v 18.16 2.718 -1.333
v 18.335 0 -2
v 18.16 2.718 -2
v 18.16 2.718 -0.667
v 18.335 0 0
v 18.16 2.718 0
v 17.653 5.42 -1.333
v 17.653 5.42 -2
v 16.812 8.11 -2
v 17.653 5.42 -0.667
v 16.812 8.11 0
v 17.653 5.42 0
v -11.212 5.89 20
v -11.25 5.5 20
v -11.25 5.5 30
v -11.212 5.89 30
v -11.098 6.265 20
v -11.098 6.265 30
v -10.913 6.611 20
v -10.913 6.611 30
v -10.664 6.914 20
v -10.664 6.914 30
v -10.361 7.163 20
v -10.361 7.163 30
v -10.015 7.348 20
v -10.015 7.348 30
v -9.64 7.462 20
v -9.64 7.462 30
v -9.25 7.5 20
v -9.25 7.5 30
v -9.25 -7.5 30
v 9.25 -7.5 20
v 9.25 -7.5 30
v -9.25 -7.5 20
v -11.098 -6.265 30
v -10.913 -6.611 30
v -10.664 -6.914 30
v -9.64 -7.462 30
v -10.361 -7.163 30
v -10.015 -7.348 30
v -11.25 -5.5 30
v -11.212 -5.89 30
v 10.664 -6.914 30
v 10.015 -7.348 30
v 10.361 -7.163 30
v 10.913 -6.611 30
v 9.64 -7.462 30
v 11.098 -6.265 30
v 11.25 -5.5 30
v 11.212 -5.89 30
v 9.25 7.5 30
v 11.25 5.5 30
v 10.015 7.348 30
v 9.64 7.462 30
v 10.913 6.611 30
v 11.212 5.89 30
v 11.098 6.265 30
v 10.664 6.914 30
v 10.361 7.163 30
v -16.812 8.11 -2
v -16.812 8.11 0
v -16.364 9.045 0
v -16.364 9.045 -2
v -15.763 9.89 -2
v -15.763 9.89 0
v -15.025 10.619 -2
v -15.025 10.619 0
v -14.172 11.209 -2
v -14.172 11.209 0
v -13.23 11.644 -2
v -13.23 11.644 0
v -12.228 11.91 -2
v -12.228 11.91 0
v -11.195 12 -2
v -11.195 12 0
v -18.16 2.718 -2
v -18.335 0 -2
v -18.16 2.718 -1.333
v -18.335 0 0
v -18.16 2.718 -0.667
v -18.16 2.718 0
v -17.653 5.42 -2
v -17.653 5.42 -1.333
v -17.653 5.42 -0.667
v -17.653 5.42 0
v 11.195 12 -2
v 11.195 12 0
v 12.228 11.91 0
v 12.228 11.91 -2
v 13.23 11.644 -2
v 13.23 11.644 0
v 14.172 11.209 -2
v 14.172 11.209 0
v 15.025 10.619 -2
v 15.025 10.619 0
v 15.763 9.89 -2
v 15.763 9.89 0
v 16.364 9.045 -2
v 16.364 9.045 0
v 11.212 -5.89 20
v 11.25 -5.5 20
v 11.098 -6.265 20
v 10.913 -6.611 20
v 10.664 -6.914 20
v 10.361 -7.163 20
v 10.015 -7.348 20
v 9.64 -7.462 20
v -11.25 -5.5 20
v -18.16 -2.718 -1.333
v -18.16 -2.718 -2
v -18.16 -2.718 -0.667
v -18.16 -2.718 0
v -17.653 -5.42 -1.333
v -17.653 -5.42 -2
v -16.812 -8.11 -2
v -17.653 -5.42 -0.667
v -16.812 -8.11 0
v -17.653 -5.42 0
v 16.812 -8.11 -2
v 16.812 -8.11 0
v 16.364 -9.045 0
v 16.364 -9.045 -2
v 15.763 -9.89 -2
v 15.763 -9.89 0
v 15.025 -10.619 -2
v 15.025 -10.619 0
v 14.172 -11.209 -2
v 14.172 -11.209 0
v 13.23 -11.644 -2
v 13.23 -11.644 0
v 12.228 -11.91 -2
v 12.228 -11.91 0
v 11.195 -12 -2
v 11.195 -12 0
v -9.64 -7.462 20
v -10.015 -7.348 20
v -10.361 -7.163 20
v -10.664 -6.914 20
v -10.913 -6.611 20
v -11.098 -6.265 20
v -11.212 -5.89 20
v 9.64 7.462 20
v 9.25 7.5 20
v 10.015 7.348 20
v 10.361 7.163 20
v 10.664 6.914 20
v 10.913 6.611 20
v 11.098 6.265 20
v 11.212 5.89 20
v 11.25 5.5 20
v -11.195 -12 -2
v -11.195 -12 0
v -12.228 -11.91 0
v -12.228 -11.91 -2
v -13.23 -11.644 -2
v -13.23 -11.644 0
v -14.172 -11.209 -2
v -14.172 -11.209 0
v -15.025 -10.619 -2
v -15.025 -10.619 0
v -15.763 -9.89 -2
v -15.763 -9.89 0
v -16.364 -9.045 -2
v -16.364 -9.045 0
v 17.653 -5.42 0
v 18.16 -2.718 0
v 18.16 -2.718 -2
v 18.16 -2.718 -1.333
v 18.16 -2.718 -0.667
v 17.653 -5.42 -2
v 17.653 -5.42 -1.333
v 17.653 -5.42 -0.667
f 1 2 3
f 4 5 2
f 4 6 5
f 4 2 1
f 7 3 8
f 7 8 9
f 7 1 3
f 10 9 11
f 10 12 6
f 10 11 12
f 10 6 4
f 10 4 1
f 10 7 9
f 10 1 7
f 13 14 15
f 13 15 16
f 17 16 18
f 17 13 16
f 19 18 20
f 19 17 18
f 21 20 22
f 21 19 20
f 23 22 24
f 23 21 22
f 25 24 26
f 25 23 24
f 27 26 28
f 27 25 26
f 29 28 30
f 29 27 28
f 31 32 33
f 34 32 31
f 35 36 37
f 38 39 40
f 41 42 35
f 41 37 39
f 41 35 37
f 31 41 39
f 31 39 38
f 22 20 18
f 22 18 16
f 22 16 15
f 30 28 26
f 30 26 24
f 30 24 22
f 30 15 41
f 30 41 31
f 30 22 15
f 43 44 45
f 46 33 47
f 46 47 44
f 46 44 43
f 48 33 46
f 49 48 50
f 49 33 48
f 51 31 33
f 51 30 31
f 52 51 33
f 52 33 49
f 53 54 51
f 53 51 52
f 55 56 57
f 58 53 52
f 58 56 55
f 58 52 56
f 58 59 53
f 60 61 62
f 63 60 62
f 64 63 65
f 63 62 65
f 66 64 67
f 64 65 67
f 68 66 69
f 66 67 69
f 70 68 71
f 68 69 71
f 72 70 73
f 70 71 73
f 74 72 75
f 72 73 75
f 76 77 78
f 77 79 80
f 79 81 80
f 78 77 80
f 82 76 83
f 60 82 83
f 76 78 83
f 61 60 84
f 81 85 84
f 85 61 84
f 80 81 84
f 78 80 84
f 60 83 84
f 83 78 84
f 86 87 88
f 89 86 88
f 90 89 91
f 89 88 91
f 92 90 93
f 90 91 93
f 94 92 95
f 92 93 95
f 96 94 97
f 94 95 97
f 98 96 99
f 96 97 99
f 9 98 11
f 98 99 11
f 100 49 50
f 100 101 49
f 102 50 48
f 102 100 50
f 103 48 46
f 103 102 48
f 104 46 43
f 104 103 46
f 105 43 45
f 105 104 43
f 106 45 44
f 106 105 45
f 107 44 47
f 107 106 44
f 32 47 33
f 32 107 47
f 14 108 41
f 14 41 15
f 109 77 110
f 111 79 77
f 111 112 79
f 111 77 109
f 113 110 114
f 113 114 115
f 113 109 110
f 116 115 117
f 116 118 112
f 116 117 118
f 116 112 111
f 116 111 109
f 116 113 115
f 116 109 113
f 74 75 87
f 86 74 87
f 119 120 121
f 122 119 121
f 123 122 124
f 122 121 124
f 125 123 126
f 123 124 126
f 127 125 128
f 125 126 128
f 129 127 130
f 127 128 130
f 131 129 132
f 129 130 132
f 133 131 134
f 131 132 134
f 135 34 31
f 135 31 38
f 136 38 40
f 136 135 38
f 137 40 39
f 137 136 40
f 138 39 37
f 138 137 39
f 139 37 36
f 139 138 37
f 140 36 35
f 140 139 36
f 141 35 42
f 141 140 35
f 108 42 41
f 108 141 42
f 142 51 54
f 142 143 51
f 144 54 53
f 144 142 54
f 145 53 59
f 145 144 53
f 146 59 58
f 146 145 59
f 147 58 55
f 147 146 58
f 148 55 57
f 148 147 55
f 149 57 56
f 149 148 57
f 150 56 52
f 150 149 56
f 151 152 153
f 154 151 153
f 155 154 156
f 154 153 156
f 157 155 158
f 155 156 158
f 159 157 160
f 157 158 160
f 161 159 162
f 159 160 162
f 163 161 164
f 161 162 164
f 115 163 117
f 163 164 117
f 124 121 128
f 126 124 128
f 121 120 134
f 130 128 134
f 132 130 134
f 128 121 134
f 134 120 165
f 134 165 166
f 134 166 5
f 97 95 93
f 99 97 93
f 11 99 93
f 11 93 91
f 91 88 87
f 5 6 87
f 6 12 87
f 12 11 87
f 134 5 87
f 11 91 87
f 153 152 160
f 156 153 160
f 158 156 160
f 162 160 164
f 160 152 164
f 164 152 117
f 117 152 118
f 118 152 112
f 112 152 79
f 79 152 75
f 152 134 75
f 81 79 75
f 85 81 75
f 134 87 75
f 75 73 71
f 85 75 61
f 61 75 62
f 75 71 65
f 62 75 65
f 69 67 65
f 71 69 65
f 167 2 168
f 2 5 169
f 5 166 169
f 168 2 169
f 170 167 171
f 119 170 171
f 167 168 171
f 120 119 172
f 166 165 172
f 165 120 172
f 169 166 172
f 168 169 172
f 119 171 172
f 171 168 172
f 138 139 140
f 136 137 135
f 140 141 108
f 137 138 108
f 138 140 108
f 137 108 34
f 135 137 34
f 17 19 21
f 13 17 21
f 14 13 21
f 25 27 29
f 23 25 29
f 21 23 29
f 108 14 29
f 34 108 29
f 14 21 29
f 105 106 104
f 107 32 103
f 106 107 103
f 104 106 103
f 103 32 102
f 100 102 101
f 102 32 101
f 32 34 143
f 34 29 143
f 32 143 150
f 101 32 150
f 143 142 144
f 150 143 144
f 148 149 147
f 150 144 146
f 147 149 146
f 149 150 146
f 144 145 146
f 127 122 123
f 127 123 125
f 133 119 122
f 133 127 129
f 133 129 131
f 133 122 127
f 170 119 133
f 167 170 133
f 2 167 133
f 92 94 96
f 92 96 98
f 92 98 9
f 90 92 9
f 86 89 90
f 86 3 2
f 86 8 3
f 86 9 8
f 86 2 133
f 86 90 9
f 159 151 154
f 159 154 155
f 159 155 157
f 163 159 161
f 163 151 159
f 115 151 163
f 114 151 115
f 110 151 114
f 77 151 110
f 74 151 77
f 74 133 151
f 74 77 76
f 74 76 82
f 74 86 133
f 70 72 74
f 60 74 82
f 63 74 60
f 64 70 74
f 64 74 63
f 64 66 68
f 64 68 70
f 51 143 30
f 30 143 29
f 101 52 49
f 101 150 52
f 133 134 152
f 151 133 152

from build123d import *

# Parameters (mm, degrees)
BOSS_EXTRUDE1_DEPTH = 10
BOSS_EXTRUDE2_START = -2
SKETCH7_W           = 17.267499136
SKETCH7_H           = 10.808758156
BOSS_EXTRUDE2_DEPTH = 2
BOSS_EXTRUDE7_DEPTH = 2
BOSS_EXTRUDE9_START = -2
BOSS_EXTRUDE9_DEPTH = 2


with BuildPart() as part:
    # Sketch6 → Boss-Extrude1 (new body)
    with BuildSketch(Plane.XY.offset(20)):
        with BuildLine():
            Line((-9.25, -7.5), (9.25, -7.5))
            ThreePointArc((9.25, -7.5), (10.664213562, -6.914213562), (11.25, -5.5))
            Line((11.25, -5.5), (11.25, 5.5))
            ThreePointArc((11.25, 5.5), (10.664213562, 6.914213562), (9.25, 7.5))
            Line((9.25, 7.5), (-9.25, 7.5))
            ThreePointArc((-9.25, 7.5), (-10.664213562, 6.914213562), (-11.25, 5.5))
            Line((-11.25, 5.5), (-11.25, -5.5))
            ThreePointArc((-11.25, -5.5), (-10.664213562, -6.914213562), (-9.25, -7.5))
        make_face()
    extrude(amount=BOSS_EXTRUDE1_DEPTH)

    # Sketch7 → Boss-Extrude2 (add)
    with BuildSketch(Plane.XY.offset(27.8).offset(BOSS_EXTRUDE2_START)):
        with BuildLine():
            Line((9.25, -7.5), (-9.25, -7.5))
            ThreePointArc((-9.25, -7.5), (-10.664213562, -6.914213562), (-11.25, -5.5))
            Line((-11.25, -5.5), (-11.25, 5.5))
            ThreePointArc((-11.25, 5.5), (-10.664213562, 6.914213562), (-9.25, 7.5))
            Line((-9.25, 7.5), (9.25, 7.5))
            ThreePointArc((9.25, 7.5), (10.664213562, 6.914213562), (11.25, 5.5))
            Line((11.25, 5.5), (11.25, -5.5))
            ThreePointArc((11.25, -5.5), (10.664213562, -6.914213562), (9.25, -7.5))
        make_face()
        Rectangle(SKETCH7_W, SKETCH7_H, mode=Mode.SUBTRACT)
    extrude(amount=BOSS_EXTRUDE2_DEPTH)

    # Sketch19 → Boss-Extrude9 (add)
    with BuildSketch(Plane.XY.offset(27.8).offset(BOSS_EXTRUDE9_START)):
        with BuildLine():
            Line((-9.25, -7.5), (9.25, -7.5))
            ThreePointArc((9.25, -7.5), (10.664213562, -6.914213562), (11.25, -5.5))
            Line((11.25, -5.5), (11.25, 5.5))
            ThreePointArc((11.25, 5.5), (10.664213562, 6.914213562), (9.25, 7.5))
            Line((9.25, 7.5), (-9.25, 7.5))
            ThreePointArc((-9.25, 7.5), (-10.664213562, 6.914213562), (-11.25, 5.5))
            Line((-11.25, 5.5), (-11.25, -5.5))
            ThreePointArc((-11.25, -5.5), (-10.664213562, -6.914213562), (-9.25, -7.5))
        make_face()
        Polygon((-8.846713109, -6.835339728), (8.846713109, -6.835339728), (8.846713109, 6.835339728), (-8.846713109, 6.835339728), (-8.846713109, 3.299585285), (-10.877917398, 3.299585285), (-10.877917398, -3.536837454), (-8.846713109, -3.536837454), align=None, mode=Mode.SUBTRACT)
    extrude(amount=BOSS_EXTRUDE9_DEPTH)


with BuildPart() as body_2:
    # Sketch1 → Boss-Extrude7 (new body)
    with BuildSketch(Plane.XY):
        with BuildLine():
            Line((-11.194828593, 12), (11.194828593, 12))
            ThreePointArc((11.194828593, 12), (14.611088975, 10.932460339), (16.811684874, 8.109721667))
            add(Edge.make_bspline(
                [(18.334712598, 0), (18.327162711, 2.726130661), (17.81951085, 5.426517645), (16.811684874, 8.109721667)],
                knots=[0.502499344, 0.502499344, 0.502499344, 0.502499344, 0.837905074, 0.837905074, 0.837905074, 0.837905074], degree=3))
            add(Edge.make_bspline(
                [(18.334712598, 0), (18.327162711, -2.726130661), (17.81951085, -5.426517645), (16.811684874, -8.109721667)],
                knots=[0.502499344, 0.502499344, 0.502499344, 0.502499344, 0.837905074, 0.837905074, 0.837905074, 0.837905074], degree=3))
            ThreePointArc((16.811684874, -8.109721667), (14.611088975, -10.932460339), (11.194828593, -12))
            Line((11.194828593, -12), (-11.194828593, -12))
            ThreePointArc((-11.194828593, -12), (-14.611088975, -10.932460339), (-16.811684874, -8.109721667))
            add(Edge.make_bspline(
                [(-18.334712598, 0), (-18.327162711, -2.726130661), (-17.81951085, -5.426517645), (-16.811684874, -8.109721667)],
                knots=[0.502499344, 0.502499344, 0.502499344, 0.502499344, 0.837905074, 0.837905074, 0.837905074, 0.837905074], degree=3))
            add(Edge.make_bspline(
                [(-18.334712598, 0), (-18.327162711, 2.726130661), (-17.81951085, 5.426517645), (-16.811684874, 8.109721667)],
                knots=[0.502499344, 0.502499344, 0.502499344, 0.502499344, 0.837905074, 0.837905074, 0.837905074, 0.837905074], degree=3))
            ThreePointArc((-16.811684874, 8.109721667), (-14.611088975, 10.932460339), (-11.194828593, 12))
        make_face()
    extrude(amount=-BOSS_EXTRUDE7_DEPTH)


solid = Compound([part.part, body_2.part])
